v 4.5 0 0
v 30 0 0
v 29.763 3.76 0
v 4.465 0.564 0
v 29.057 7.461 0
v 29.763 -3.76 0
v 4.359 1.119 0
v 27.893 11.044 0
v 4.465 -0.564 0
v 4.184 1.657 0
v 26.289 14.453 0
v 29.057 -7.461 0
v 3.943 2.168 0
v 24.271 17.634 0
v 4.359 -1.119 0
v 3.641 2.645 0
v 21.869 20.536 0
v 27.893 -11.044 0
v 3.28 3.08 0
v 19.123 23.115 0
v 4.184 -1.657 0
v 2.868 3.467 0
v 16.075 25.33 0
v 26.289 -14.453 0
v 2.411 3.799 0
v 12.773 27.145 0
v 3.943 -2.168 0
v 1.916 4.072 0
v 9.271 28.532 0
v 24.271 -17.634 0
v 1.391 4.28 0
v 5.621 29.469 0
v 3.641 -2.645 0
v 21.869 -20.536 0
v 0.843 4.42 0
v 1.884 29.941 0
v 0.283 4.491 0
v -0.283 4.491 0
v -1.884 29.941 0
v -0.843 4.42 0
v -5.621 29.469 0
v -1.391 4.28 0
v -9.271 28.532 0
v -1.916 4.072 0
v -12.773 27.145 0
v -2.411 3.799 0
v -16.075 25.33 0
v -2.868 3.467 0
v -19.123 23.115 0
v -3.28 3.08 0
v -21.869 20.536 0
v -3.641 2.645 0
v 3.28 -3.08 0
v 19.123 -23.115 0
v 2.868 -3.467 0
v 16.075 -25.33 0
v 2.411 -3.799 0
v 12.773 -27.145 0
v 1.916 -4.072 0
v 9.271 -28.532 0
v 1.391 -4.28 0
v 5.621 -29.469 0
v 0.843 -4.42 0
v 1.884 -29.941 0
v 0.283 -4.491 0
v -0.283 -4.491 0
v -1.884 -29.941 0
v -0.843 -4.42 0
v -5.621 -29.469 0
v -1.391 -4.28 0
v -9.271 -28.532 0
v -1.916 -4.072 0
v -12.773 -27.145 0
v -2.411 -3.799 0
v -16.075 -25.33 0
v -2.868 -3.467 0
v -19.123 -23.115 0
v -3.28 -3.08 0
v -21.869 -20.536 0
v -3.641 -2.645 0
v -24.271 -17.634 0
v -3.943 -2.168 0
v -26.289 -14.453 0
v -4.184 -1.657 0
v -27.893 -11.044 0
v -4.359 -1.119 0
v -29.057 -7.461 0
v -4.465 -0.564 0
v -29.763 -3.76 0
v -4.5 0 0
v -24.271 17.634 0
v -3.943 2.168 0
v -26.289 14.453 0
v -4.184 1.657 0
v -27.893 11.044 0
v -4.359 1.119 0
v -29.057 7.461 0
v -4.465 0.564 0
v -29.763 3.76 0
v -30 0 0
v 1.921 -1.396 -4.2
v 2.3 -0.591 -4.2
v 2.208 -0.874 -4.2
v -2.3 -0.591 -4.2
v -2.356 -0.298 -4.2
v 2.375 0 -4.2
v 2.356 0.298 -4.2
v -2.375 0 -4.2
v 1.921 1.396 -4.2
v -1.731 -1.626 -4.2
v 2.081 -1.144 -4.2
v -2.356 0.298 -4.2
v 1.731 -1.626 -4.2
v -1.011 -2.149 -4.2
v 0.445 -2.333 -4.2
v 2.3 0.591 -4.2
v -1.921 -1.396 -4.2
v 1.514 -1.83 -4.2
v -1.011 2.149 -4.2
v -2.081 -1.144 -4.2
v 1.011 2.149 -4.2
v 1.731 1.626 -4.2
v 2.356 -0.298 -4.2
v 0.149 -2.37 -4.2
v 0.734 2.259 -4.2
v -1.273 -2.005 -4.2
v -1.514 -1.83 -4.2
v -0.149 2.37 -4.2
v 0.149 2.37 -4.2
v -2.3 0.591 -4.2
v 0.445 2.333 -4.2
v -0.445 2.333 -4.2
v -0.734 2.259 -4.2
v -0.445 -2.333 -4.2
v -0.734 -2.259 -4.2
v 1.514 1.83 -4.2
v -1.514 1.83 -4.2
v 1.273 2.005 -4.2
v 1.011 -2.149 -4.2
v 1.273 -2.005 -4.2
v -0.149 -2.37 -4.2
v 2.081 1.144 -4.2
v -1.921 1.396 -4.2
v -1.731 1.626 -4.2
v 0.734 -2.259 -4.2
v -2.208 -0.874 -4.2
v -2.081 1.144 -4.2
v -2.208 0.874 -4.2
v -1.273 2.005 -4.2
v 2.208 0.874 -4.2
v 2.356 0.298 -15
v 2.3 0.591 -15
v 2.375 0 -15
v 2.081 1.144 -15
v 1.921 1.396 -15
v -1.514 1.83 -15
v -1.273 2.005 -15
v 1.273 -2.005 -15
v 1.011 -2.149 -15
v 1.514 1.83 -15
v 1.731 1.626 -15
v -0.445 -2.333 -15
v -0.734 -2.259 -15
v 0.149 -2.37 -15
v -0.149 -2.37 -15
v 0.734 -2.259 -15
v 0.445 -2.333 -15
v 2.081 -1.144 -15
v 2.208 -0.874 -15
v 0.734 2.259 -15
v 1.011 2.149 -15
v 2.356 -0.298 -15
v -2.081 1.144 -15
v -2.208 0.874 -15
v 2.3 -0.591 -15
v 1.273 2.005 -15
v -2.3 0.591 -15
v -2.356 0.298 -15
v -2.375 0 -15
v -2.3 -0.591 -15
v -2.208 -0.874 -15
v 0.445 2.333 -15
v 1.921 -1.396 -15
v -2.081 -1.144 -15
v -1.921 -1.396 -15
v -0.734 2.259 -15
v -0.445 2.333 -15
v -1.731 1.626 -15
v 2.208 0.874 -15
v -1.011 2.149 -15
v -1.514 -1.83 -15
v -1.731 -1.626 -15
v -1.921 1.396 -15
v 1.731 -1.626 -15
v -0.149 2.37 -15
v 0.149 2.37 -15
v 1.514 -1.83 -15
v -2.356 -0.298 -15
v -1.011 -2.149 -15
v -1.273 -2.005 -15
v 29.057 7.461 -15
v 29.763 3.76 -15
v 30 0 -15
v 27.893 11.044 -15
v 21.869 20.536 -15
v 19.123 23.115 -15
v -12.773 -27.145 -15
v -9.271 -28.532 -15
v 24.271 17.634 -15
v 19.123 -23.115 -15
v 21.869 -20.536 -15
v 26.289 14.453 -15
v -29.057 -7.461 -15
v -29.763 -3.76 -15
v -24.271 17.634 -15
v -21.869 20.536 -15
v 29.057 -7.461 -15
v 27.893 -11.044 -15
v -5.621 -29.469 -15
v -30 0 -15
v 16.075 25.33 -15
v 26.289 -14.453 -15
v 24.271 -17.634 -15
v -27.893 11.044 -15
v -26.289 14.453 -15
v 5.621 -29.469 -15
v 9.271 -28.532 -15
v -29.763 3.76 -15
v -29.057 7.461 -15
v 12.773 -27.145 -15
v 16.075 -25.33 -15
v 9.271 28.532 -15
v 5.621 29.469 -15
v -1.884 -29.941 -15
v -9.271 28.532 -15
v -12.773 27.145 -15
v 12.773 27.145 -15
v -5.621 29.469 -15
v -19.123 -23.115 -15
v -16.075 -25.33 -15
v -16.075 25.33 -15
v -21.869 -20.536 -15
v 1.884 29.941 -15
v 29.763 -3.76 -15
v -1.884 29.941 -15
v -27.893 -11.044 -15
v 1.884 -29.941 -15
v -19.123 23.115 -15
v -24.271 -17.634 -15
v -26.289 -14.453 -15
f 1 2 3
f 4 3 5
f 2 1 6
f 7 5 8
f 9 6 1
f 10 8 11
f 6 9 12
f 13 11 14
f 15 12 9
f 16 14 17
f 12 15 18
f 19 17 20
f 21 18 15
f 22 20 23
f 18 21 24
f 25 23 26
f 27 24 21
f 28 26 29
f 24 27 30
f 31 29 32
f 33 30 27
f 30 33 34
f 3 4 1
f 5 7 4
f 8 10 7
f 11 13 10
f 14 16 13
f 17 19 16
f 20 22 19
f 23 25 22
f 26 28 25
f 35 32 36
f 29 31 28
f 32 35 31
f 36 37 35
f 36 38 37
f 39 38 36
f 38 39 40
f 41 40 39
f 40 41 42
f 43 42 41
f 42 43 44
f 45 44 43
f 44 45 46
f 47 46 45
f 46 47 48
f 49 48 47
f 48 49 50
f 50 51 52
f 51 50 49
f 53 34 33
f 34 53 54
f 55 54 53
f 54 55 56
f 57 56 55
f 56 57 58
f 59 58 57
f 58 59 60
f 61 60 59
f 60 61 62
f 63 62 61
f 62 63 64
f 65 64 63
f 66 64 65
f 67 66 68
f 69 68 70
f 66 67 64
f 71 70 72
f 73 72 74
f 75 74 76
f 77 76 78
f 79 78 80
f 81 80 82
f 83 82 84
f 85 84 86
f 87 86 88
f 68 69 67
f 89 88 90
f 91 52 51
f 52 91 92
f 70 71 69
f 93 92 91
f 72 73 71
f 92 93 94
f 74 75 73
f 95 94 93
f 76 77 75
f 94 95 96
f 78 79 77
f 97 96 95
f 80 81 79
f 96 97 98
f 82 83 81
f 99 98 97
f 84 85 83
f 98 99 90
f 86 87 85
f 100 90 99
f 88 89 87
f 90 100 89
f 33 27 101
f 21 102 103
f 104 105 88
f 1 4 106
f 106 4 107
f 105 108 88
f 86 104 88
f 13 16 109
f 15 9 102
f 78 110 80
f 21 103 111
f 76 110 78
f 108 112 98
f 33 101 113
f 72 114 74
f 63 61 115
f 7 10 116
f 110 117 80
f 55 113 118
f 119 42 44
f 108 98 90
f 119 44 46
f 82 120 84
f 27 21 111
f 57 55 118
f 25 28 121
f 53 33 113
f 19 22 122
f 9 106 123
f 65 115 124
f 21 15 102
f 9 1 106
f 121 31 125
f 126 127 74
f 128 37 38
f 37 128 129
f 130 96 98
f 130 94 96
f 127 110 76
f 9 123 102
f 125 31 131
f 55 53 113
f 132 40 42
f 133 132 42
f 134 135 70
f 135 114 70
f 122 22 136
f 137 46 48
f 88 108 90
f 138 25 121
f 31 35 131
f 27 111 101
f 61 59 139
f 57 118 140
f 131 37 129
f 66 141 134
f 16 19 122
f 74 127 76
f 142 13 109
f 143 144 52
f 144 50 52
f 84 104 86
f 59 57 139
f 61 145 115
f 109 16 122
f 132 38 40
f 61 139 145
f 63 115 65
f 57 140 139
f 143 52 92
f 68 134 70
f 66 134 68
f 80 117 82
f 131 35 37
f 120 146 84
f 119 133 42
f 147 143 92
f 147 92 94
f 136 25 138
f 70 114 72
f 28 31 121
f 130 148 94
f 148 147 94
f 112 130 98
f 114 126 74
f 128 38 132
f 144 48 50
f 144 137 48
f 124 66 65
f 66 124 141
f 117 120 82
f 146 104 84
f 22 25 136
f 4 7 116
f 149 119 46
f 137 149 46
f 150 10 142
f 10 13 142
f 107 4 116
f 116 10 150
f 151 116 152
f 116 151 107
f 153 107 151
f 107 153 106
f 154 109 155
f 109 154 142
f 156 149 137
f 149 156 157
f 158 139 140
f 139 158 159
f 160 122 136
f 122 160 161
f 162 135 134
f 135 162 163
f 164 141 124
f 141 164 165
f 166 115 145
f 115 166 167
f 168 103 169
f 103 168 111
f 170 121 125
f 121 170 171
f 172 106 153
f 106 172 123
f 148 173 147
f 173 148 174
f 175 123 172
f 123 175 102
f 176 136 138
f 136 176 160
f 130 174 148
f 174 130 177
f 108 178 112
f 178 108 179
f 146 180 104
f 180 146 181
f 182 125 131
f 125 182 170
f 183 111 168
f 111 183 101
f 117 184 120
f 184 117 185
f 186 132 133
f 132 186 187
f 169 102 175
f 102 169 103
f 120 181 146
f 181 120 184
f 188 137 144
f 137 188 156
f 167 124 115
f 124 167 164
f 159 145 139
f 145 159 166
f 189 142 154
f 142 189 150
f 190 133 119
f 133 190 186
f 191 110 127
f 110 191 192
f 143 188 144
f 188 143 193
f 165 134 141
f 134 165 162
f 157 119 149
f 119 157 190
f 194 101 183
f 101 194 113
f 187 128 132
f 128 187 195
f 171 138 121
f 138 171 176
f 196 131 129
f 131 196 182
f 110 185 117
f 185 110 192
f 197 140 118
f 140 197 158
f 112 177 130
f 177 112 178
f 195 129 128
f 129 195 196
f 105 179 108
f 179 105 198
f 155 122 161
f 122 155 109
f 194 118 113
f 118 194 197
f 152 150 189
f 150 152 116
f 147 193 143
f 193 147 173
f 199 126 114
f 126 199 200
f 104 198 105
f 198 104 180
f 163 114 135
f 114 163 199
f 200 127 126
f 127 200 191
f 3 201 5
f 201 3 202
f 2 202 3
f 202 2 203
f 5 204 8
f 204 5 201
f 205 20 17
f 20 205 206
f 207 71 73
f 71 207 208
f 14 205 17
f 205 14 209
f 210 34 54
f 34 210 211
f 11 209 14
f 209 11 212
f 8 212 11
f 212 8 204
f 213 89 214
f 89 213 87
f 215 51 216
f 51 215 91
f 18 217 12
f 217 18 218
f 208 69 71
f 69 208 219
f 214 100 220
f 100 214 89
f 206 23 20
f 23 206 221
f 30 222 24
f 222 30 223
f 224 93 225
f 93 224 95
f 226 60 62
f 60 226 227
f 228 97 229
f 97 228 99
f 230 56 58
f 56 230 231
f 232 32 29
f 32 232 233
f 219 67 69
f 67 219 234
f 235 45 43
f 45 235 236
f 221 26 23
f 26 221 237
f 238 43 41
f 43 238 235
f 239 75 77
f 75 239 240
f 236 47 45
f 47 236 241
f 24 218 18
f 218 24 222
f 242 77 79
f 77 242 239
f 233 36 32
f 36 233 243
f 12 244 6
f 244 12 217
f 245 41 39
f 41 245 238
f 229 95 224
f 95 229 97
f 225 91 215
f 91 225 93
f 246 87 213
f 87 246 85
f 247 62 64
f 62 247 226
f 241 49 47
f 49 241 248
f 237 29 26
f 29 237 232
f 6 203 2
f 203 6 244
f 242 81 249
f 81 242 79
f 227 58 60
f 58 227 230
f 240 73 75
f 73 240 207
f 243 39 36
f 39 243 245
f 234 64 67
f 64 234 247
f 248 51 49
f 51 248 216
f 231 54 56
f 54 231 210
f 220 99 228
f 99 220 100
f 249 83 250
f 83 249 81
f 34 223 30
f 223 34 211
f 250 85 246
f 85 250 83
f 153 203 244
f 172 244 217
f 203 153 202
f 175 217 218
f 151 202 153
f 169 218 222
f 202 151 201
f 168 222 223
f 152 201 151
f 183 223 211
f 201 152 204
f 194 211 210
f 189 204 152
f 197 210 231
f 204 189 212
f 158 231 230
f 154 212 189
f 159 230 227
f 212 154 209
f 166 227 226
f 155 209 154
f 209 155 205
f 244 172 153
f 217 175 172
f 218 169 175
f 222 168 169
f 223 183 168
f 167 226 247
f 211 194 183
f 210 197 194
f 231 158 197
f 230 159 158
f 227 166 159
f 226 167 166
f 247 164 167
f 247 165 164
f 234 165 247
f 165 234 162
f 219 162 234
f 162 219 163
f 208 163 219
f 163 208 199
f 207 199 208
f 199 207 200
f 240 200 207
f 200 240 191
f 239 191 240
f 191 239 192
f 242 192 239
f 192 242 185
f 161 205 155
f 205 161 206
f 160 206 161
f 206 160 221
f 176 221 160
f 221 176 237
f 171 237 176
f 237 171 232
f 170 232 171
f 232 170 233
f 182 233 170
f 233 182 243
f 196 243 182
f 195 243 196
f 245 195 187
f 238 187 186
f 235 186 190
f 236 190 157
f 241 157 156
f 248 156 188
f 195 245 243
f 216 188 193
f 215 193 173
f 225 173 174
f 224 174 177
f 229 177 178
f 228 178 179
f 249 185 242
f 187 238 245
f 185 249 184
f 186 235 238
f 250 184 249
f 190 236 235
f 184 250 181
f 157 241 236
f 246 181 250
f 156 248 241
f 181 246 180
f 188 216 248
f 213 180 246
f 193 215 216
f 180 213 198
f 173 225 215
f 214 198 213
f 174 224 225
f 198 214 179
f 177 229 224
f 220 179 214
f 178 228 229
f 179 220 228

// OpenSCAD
$fn = 50;

difference() {
	union() {
		translate(v = [0, 0, -15.0]) {
			cylinder(h = 15, r = 30.0);
		}
	}
	union() {
		translate(v = [0, 0, 0]) {
			rotate(a = [0, 0, 0]) {
				difference() {
					union() {
						translate(v = [0, 0, -18.0]) {
							cylinder(h = 18, r = 2.25);
						}
						translate(v = [0, 0, -4.2]) {
							cylinder(h = 4.2, r1 = 2.375, r2 = 4.5);
						}
						translate(v = [0, 0, -18.0]) {
							cylinder(h = 18, r = 2.375);
						}
						translate(v = [0, 0, -18.0]) {
							cylinder(h = 18, r = 2.25);
						}
					}
					union();
				}
			}
		}
	}
}
